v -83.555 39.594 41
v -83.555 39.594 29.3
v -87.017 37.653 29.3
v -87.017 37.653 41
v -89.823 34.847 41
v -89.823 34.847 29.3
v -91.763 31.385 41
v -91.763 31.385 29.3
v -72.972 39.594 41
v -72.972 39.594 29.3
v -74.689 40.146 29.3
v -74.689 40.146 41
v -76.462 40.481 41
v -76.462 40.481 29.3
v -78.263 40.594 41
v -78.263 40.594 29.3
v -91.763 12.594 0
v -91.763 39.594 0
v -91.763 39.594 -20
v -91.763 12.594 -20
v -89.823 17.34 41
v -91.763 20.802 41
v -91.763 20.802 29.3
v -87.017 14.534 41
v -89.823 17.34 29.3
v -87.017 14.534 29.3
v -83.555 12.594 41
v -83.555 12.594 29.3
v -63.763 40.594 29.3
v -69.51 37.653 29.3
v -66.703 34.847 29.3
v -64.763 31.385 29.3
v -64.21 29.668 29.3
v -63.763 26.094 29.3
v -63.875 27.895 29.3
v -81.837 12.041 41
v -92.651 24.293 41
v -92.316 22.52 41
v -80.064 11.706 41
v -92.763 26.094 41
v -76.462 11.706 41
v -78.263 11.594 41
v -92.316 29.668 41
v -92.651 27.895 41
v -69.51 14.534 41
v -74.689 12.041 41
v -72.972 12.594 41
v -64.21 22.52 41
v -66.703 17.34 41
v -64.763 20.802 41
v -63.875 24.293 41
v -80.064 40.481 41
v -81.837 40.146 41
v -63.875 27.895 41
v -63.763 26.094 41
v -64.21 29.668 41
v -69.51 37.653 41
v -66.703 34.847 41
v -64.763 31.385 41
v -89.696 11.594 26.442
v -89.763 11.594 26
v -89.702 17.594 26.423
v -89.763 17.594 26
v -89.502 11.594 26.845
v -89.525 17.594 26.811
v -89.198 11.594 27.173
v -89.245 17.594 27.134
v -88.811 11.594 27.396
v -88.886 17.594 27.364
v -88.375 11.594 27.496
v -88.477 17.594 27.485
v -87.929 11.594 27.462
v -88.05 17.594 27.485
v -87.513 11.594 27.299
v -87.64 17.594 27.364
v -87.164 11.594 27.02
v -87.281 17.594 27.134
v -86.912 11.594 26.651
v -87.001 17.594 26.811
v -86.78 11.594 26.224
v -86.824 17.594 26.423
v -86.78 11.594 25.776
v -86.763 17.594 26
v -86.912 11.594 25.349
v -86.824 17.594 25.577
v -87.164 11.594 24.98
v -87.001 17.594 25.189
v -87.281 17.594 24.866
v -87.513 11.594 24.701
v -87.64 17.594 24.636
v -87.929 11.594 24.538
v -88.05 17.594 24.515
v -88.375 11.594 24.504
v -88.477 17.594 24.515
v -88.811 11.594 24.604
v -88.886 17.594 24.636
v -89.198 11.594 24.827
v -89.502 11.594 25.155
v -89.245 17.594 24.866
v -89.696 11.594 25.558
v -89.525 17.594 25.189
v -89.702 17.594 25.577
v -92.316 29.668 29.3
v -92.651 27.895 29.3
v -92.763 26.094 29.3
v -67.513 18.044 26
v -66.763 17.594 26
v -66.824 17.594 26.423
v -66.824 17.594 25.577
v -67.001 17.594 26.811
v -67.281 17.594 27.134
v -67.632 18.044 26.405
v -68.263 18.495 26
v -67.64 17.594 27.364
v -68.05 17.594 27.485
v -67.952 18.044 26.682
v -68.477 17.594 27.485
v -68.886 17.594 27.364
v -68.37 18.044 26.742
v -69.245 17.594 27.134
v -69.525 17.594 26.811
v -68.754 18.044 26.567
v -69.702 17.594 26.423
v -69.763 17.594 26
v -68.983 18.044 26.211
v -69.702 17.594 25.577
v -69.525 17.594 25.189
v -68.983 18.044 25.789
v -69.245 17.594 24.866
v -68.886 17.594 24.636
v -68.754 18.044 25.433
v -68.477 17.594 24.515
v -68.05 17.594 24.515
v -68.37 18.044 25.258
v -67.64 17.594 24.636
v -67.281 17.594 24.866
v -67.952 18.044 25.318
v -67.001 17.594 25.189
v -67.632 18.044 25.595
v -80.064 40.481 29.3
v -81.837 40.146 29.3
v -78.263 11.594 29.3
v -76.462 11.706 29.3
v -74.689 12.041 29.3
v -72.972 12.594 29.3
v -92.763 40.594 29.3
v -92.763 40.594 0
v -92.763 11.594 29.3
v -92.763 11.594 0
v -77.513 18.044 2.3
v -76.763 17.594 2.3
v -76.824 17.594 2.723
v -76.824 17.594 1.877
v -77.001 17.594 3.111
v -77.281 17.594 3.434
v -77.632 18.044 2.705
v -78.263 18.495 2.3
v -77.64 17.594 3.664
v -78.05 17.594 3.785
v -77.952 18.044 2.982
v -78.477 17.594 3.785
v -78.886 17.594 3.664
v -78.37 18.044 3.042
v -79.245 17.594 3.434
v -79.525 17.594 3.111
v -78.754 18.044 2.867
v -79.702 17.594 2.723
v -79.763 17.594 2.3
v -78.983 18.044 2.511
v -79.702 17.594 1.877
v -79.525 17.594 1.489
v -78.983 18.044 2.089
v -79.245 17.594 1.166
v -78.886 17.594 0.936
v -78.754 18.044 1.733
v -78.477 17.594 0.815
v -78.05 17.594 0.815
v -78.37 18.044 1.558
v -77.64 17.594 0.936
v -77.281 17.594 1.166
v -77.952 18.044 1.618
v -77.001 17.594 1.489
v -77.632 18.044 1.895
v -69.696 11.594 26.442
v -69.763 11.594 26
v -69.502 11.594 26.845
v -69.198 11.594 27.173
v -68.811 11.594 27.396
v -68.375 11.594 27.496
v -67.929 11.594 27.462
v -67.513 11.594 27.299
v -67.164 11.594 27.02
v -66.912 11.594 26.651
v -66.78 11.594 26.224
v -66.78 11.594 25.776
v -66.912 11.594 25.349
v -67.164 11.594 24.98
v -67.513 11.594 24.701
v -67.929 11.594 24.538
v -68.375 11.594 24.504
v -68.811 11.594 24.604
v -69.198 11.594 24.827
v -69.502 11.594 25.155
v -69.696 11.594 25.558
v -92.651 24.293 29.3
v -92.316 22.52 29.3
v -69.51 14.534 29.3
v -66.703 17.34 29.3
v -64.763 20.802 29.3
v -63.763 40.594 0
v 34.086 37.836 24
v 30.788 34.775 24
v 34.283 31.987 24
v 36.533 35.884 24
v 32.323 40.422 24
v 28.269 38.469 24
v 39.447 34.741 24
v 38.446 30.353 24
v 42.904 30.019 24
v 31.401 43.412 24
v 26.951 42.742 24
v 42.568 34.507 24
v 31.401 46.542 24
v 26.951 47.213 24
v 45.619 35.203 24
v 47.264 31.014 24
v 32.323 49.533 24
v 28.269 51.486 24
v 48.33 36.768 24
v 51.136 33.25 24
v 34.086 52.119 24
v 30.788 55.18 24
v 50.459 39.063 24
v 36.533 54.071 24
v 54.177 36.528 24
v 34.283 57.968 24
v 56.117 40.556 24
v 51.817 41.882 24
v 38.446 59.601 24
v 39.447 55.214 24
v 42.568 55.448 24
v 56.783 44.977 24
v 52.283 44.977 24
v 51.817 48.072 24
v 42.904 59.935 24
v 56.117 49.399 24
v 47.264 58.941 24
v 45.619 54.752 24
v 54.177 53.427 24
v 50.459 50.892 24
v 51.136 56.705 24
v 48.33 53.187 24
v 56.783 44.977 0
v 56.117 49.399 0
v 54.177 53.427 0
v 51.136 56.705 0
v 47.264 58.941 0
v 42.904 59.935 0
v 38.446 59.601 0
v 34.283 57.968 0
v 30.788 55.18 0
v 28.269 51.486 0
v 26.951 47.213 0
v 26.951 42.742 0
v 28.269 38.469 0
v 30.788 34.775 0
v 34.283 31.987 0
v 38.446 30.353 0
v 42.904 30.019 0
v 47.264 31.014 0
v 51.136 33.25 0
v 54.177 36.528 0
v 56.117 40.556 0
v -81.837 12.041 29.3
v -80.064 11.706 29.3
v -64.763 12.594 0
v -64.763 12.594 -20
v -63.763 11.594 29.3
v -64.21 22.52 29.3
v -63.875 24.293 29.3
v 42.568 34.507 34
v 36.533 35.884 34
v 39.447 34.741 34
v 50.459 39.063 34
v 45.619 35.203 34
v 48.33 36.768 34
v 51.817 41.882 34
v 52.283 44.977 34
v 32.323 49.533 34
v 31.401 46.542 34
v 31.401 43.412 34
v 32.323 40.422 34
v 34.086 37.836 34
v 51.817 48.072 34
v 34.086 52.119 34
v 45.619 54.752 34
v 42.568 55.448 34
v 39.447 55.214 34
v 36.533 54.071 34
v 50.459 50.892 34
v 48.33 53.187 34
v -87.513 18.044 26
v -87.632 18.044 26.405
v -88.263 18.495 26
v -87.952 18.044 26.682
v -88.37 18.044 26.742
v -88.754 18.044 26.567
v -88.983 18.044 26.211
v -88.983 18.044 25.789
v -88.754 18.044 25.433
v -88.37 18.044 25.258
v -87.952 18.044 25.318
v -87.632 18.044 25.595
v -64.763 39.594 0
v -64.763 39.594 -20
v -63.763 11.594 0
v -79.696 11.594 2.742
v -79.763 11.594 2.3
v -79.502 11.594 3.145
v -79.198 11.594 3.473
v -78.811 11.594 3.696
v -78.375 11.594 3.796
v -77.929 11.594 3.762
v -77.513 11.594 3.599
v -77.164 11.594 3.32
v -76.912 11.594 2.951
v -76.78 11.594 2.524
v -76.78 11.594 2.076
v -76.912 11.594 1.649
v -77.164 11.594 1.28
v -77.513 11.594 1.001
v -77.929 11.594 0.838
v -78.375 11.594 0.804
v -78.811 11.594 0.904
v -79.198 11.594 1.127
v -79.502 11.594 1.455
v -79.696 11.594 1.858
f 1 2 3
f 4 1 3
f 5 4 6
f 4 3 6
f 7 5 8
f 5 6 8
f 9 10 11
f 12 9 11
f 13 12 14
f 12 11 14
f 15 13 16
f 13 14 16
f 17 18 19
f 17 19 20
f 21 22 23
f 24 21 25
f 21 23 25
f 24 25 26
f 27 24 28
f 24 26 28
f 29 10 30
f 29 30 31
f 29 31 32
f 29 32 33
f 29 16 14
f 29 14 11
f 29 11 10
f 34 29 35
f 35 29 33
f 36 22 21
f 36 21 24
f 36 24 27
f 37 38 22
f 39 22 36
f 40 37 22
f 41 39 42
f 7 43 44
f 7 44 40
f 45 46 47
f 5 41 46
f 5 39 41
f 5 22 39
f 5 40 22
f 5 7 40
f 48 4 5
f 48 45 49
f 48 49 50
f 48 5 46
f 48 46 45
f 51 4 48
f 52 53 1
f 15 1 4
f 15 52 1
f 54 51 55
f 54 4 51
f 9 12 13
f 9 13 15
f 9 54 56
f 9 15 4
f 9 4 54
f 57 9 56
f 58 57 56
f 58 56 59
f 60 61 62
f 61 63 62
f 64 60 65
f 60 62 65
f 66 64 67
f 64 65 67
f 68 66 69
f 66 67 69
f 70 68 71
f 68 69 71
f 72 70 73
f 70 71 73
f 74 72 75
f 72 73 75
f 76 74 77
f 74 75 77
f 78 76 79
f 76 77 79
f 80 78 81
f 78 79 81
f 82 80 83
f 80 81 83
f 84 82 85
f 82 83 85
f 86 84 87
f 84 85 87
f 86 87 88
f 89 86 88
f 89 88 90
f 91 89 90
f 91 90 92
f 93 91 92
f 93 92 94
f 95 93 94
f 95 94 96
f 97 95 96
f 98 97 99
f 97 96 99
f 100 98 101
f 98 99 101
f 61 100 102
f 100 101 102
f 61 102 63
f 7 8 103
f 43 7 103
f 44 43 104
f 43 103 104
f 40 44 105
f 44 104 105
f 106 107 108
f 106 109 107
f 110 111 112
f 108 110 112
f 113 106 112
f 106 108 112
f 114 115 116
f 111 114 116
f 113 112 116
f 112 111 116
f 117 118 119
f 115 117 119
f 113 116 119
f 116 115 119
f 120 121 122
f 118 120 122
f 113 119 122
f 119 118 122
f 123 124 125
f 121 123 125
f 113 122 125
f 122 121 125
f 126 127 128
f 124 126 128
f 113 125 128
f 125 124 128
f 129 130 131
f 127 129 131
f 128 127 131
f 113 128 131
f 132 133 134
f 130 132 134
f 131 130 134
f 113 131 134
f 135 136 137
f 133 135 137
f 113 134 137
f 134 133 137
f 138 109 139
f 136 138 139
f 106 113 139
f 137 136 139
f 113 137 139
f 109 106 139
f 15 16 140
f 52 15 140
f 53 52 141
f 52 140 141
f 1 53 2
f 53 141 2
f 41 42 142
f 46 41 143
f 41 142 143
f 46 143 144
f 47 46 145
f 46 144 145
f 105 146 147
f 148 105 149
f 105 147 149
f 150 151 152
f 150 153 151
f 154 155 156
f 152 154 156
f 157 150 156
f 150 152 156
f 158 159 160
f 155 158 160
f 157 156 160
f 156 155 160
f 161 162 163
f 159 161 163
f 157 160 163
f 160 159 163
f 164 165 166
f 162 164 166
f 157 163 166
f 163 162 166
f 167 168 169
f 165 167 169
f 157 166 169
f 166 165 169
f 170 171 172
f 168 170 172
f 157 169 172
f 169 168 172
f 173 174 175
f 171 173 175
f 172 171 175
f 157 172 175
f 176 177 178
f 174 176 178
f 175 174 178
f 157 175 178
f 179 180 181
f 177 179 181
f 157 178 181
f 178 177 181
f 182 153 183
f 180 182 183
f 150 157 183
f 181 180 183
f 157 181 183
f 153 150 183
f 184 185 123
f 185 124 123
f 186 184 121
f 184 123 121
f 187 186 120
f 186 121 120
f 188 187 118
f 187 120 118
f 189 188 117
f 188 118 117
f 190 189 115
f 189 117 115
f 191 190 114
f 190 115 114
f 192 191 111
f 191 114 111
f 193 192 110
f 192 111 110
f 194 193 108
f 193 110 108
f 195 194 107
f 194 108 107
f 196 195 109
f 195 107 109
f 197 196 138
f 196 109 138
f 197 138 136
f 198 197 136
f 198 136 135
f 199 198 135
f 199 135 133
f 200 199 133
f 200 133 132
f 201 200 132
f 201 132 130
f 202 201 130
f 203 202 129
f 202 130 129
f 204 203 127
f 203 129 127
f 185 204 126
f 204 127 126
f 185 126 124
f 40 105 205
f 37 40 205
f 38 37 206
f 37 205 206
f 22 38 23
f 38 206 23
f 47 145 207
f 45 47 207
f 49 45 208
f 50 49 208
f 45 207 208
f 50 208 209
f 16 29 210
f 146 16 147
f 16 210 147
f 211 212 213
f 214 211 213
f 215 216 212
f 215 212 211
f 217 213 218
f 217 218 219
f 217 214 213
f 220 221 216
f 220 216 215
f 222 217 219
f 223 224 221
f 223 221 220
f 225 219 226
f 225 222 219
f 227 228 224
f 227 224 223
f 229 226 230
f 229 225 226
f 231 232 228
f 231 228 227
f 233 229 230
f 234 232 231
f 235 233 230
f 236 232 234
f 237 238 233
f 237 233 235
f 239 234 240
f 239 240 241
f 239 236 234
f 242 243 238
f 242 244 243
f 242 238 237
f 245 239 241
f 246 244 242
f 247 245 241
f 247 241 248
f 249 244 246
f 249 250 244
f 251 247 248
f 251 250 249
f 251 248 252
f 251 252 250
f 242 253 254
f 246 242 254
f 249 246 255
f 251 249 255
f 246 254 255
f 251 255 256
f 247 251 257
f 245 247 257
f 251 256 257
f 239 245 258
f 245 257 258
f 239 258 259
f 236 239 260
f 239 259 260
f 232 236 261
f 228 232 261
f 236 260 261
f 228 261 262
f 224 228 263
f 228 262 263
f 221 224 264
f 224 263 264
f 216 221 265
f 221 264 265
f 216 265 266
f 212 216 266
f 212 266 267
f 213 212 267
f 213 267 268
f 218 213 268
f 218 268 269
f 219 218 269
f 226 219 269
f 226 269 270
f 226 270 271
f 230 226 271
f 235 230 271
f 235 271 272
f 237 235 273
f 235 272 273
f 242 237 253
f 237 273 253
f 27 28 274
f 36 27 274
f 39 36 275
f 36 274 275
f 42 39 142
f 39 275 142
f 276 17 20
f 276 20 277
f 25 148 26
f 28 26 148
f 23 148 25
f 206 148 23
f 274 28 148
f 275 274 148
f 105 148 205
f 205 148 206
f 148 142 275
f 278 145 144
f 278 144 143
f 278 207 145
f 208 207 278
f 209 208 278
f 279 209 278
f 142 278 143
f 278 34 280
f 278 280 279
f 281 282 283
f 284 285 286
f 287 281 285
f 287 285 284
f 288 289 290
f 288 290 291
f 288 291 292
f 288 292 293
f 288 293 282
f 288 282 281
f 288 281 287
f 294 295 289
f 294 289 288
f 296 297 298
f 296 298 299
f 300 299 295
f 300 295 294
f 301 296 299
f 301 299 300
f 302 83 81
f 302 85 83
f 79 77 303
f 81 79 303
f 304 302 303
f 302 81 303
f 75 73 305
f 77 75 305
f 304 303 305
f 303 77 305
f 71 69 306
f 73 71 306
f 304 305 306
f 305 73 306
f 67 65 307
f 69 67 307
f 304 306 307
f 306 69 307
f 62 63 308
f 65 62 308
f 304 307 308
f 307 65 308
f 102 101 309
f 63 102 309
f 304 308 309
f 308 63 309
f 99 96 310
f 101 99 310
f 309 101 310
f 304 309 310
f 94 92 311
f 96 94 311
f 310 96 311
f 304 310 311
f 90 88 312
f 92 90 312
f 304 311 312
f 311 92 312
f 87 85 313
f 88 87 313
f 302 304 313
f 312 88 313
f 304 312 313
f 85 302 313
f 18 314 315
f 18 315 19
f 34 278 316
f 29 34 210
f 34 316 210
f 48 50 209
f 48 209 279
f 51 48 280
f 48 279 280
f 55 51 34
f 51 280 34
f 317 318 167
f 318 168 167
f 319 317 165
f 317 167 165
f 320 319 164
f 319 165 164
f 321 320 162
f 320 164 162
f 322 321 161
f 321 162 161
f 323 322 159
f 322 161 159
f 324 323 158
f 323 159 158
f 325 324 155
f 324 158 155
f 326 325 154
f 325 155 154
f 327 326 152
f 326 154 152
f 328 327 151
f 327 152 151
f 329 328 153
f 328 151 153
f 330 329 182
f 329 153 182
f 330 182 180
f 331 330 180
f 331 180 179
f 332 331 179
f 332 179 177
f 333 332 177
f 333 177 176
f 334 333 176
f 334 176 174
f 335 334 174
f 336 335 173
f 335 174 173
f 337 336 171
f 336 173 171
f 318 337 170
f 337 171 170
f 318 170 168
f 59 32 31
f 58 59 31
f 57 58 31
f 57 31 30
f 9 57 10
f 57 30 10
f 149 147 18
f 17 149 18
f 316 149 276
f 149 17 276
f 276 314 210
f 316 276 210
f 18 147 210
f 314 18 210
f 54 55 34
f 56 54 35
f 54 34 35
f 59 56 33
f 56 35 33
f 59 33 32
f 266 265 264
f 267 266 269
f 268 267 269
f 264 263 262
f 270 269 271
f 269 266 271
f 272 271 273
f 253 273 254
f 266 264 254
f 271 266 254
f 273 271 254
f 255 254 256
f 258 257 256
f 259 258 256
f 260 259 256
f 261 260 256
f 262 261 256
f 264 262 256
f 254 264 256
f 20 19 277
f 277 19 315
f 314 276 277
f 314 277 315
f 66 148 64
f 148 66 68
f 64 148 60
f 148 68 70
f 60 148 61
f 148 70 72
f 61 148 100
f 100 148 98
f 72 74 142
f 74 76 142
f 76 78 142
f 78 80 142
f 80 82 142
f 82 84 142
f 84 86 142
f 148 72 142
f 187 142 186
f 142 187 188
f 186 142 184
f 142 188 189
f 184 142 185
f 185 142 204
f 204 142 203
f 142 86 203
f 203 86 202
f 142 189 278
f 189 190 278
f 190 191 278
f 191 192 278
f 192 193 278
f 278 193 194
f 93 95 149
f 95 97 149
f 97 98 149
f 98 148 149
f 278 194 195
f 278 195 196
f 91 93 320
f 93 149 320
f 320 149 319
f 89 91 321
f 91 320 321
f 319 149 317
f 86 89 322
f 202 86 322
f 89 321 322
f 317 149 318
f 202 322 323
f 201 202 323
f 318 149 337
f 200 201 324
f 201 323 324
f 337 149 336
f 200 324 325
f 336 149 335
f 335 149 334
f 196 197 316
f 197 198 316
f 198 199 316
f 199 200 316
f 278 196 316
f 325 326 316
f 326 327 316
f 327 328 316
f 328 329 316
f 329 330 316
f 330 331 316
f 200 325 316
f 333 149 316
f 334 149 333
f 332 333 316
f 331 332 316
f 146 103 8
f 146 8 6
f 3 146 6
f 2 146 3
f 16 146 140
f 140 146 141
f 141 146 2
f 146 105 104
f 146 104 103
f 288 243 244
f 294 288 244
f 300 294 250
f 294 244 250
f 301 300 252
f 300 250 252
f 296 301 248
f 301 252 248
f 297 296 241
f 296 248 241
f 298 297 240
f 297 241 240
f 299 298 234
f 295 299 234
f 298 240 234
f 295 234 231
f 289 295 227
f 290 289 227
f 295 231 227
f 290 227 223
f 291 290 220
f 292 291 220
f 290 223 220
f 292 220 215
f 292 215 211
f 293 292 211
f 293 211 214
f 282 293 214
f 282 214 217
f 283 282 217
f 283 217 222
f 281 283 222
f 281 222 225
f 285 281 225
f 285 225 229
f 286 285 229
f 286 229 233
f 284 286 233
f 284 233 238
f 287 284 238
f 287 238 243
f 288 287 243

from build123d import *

# Parameters (mm, degrees)
F1_DEPTH = 29.3
F2_DEPTH = 41
F0_R     = 15
F0_R_2   = 10.5
F3_DEPTH = 24
F4_DEPTH = 34
F5_DEPTH = 20
F7_D     = 3
F7_DEPTH = 6
F7_TIP   = 0.9012909285


with BuildPart() as f1:
    # F0 (on Top) → F1 (new body)
    with BuildSketch(Plane.XY):
        with BuildLine():
            Line((-63.763101964, 40.5936958569), (-78.263101964, 40.5936958569))
            ThreePointArc((-78.263101964, 40.5936958569), (-75.5705195605, 40.3415027057), (-72.9715993419, 39.5936958569))
            Line((-72.9715993419, 39.5936958569), (-64.763101964, 39.5936958569))
            Line((-64.763101964, 39.5936958569), (-64.763101964, 31.3851984791))
            ThreePointArc((-64.763101964, 31.3851984791), (-64.0152951153, 28.7862782605), (-63.763101964, 26.0936958569))
            Line((-63.763101964, 26.0936958569), (-63.763101964, 40.5936958569))
        make_face()
        with BuildLine():
            Line((-63.763101964, 11.5936958569), (-63.763101964, 26.0936958569))
            ThreePointArc((-63.763101964, 26.0936958569), (-64.0152951153, 23.4011134534), (-64.763101964, 20.8021932348))
            Line((-64.763101964, 20.8021932348), (-64.763101964, 12.5936958569))
            Line((-64.763101964, 12.5936958569), (-72.9715993419, 12.5936958569))
            ThreePointArc((-72.9715993419, 12.5936958569), (-75.5705195605, 11.8458890082), (-78.263101964, 11.5936958569))
            Line((-78.263101964, 11.5936958569), (-63.763101964, 11.5936958569))
        make_face()
        with BuildLine():
            ThreePointArc((-72.9715993419, 39.5936958569), (-75.5705195605, 40.3415027057), (-78.263101964, 40.5936958569))
            ThreePointArc((-78.263101964, 40.5936958569), (-80.9556843676, 40.3415027057), (-83.5546045862, 39.5936958569))
            Line((-83.5546045862, 39.5936958569), (-72.9715993419, 39.5936958569))
        make_face()
        with BuildLine():
            Line((-78.263101964, 40.5936958569), (-92.763101964, 40.5936958569))
            Line((-92.763101964, 40.5936958569), (-92.763101964, 26.0936958569))
            ThreePointArc((-92.763101964, 26.0936958569), (-92.5109088128, 28.7862782605), (-91.763101964, 31.3851984791))
            Line((-91.763101964, 31.3851984791), (-91.763101964, 39.5936958569))
            Line((-91.763101964, 39.5936958569), (-83.5546045862, 39.5936958569))
            ThreePointArc((-83.5546045862, 39.5936958569), (-80.9556843676, 40.3415027057), (-78.263101964, 40.5936958569))
        make_face()
        with BuildLine():
            ThreePointArc((-64.763101964, 31.3851984791), (-68.0100536368, 36.3467441841), (-72.9715993419, 39.5936958569))
            Line((-72.9715993419, 39.5936958569), (-83.5546045862, 39.5936958569))
            ThreePointArc((-83.5546045862, 39.5936958569), (-88.5161502912, 36.3467441841), (-91.763101964, 31.3851984791))
            Line((-91.763101964, 31.3851984791), (-91.763101964, 20.8021932348))
            ThreePointArc((-91.763101964, 20.8021932348), (-88.5161502912, 15.8406475297), (-83.5546045862, 12.5936958569))
            Line((-83.5546045862, 12.5936958569), (-72.9715993419, 12.5936958569))
            ThreePointArc((-72.9715993419, 12.5936958569), (-68.0100536368, 15.8406475297), (-64.763101964, 20.8021932348))
            Line((-64.763101964, 20.8021932348), (-64.763101964, 31.3851984791))
        make_face()
        with BuildLine():
            Line((-64.763101964, 39.5936958569), (-72.9715993419, 39.5936958569))
            ThreePointArc((-72.9715993419, 39.5936958569), (-68.0100536368, 36.3467441841), (-64.763101964, 31.3851984791))
            Line((-64.763101964, 31.3851984791), (-64.763101964, 39.5936958569))
        make_face()
        with BuildLine():
            ThreePointArc((-91.763101964, 31.3851984791), (-88.5161502912, 36.3467441841), (-83.5546045862, 39.5936958569))
            Line((-83.5546045862, 39.5936958569), (-91.763101964, 39.5936958569))
            Line((-91.763101964, 39.5936958569), (-91.763101964, 31.3851984791))
        make_face()
        with BuildLine():
            ThreePointArc((-83.5546045862, 12.5936958569), (-88.5161502912, 15.8406475297), (-91.763101964, 20.8021932348))
            Line((-91.763101964, 20.8021932348), (-91.763101964, 12.5936958569))
            Line((-91.763101964, 12.5936958569), (-83.5546045862, 12.5936958569))
        make_face()
        with BuildLine():
            Line((-64.763101964, 12.5936958569), (-64.763101964, 20.8021932348))
            ThreePointArc((-64.763101964, 20.8021932348), (-68.0100536368, 15.8406475297), (-72.9715993419, 12.5936958569))
            Line((-72.9715993419, 12.5936958569), (-64.763101964, 12.5936958569))
        make_face()
        with BuildLine():
            ThreePointArc((-83.5546045862, 12.5936958569), (-80.9556843676, 11.8458890082), (-78.263101964, 11.5936958569))
            ThreePointArc((-78.263101964, 11.5936958569), (-75.5705195605, 11.8458890082), (-72.9715993419, 12.5936958569))
            Line((-72.9715993419, 12.5936958569), (-83.5546045862, 12.5936958569))
        make_face()
        with BuildLine():
            ThreePointArc((-91.763101964, 20.8021932348), (-92.5109088128, 23.4011134534), (-92.763101964, 26.0936958569))
            Line((-92.763101964, 26.0936958569), (-92.763101964, 11.5936958569))
            Line((-92.763101964, 11.5936958569), (-78.263101964, 11.5936958569))
            ThreePointArc((-78.263101964, 11.5936958569), (-80.9556843676, 11.8458890082), (-83.5546045862, 12.5936958569))
            Line((-83.5546045862, 12.5936958569), (-91.763101964, 12.5936958569))
            Line((-91.763101964, 12.5936958569), (-91.763101964, 20.8021932348))
        make_face()
        with BuildLine():
            ThreePointArc((-64.763101964, 20.8021932348), (-64.0152951153, 23.4011134534), (-63.763101964, 26.0936958569))
            ThreePointArc((-63.763101964, 26.0936958569), (-64.0152951153, 28.7862782605), (-64.763101964, 31.3851984791))
            Line((-64.763101964, 31.3851984791), (-64.763101964, 20.8021932348))
        make_face()
        with BuildLine():
            ThreePointArc((-91.763101964, 31.3851984791), (-92.5109088128, 28.7862782605), (-92.763101964, 26.0936958569))
            ThreePointArc((-92.763101964, 26.0936958569), (-92.5109088128, 23.4011134534), (-91.763101964, 20.8021932348))
            Line((-91.763101964, 20.8021932348), (-91.763101964, 31.3851984791))
        make_face()
    extrude(amount=F1_DEPTH)

    # F0 (on Top) → F2 (join)
    with BuildSketch(Plane.XY):
        with BuildLine():
            ThreePointArc((-72.9715993419, 39.5936958569), (-75.5705195605, 40.3415027057), (-78.263101964, 40.5936958569))
            ThreePointArc((-78.263101964, 40.5936958569), (-80.9556843676, 40.3415027057), (-83.5546045862, 39.5936958569))
            Line((-83.5546045862, 39.5936958569), (-72.9715993419, 39.5936958569))
        make_face()
        with BuildLine():
            ThreePointArc((-64.763101964, 31.3851984791), (-68.0100536368, 36.3467441841), (-72.9715993419, 39.5936958569))
            Line((-72.9715993419, 39.5936958569), (-83.5546045862, 39.5936958569))
            ThreePointArc((-83.5546045862, 39.5936958569), (-88.5161502912, 36.3467441841), (-91.763101964, 31.3851984791))
            Line((-91.763101964, 31.3851984791), (-91.763101964, 20.8021932348))
            ThreePointArc((-91.763101964, 20.8021932348), (-88.5161502912, 15.8406475297), (-83.5546045862, 12.5936958569))
            Line((-83.5546045862, 12.5936958569), (-72.9715993419, 12.5936958569))
            ThreePointArc((-72.9715993419, 12.5936958569), (-68.0100536368, 15.8406475297), (-64.763101964, 20.8021932348))
            Line((-64.763101964, 20.8021932348), (-64.763101964, 31.3851984791))
        make_face()
        with BuildLine():
            ThreePointArc((-91.763101964, 31.3851984791), (-92.5109088128, 28.7862782605), (-92.763101964, 26.0936958569))
            ThreePointArc((-92.763101964, 26.0936958569), (-92.5109088128, 23.4011134534), (-91.763101964, 20.8021932348))
            Line((-91.763101964, 20.8021932348), (-91.763101964, 31.3851984791))
        make_face()
        with BuildLine():
            ThreePointArc((-83.5546045862, 12.5936958569), (-80.9556843676, 11.8458890082), (-78.263101964, 11.5936958569))
            ThreePointArc((-78.263101964, 11.5936958569), (-75.5705195605, 11.8458890082), (-72.9715993419, 12.5936958569))
            Line((-72.9715993419, 12.5936958569), (-83.5546045862, 12.5936958569))
        make_face()
        with BuildLine():
            ThreePointArc((-64.763101964, 20.8021932348), (-64.0152951153, 23.4011134534), (-63.763101964, 26.0936958569))
            ThreePointArc((-63.763101964, 26.0936958569), (-64.0152951153, 28.7862782605), (-64.763101964, 31.3851984791))
            Line((-64.763101964, 31.3851984791), (-64.763101964, 20.8021932348))
        make_face()
    extrude(amount=F2_DEPTH)

    # F0 (on Top) → F5 (join)
    with BuildSketch(Plane.XY):
        with BuildLine():
            ThreePointArc((-64.763101964, 31.3851984791), (-68.0100536368, 36.3467441841), (-72.9715993419, 39.5936958569))
            Line((-72.9715993419, 39.5936958569), (-83.5546045862, 39.5936958569))
            ThreePointArc((-83.5546045862, 39.5936958569), (-88.5161502912, 36.3467441841), (-91.763101964, 31.3851984791))
            Line((-91.763101964, 31.3851984791), (-91.763101964, 20.8021932348))
            ThreePointArc((-91.763101964, 20.8021932348), (-88.5161502912, 15.8406475297), (-83.5546045862, 12.5936958569))
            Line((-83.5546045862, 12.5936958569), (-72.9715993419, 12.5936958569))
            ThreePointArc((-72.9715993419, 12.5936958569), (-68.0100536368, 15.8406475297), (-64.763101964, 20.8021932348))
            Line((-64.763101964, 20.8021932348), (-64.763101964, 31.3851984791))
        make_face()
        with BuildLine():
            Line((-64.763101964, 39.5936958569), (-72.9715993419, 39.5936958569))
            ThreePointArc((-72.9715993419, 39.5936958569), (-68.0100536368, 36.3467441841), (-64.763101964, 31.3851984791))
            Line((-64.763101964, 31.3851984791), (-64.763101964, 39.5936958569))
        make_face()
        with BuildLine():
            ThreePointArc((-91.763101964, 31.3851984791), (-88.5161502912, 36.3467441841), (-83.5546045862, 39.5936958569))
            Line((-83.5546045862, 39.5936958569), (-91.763101964, 39.5936958569))
            Line((-91.763101964, 39.5936958569), (-91.763101964, 31.3851984791))
        make_face()
        with BuildLine():
            ThreePointArc((-83.5546045862, 12.5936958569), (-88.5161502912, 15.8406475297), (-91.763101964, 20.8021932348))
            Line((-91.763101964, 20.8021932348), (-91.763101964, 12.5936958569))
            Line((-91.763101964, 12.5936958569), (-83.5546045862, 12.5936958569))
        make_face()
        with BuildLine():
            Line((-64.763101964, 12.5936958569), (-64.763101964, 20.8021932348))
            ThreePointArc((-64.763101964, 20.8021932348), (-68.0100536368, 15.8406475297), (-72.9715993419, 12.5936958569))
            Line((-72.9715993419, 12.5936958569), (-64.763101964, 12.5936958569))
        make_face()
    extrude(amount=-F5_DEPTH)

    # F7
    with Locations(Plane.XZ.offset(-11.5936958569)):
        with Locations((-68.263101964, 26), (-78.263101964, 2.3), (-88.263101964, 26)):
            Hole(F7_D / 2, depth=F7_DEPTH)
            with Locations((0, 0, -(F7_DEPTH + F7_TIP / 2))):  # 118° drill point
                Cone(0, F7_D / 2, F7_TIP, mode=Mode.SUBTRACT)


with BuildPart() as f3:
    # F0 (on Top) → F3 (new body)
    with BuildSketch(Plane.XY):
        with Locations((41.7834050647, 44.9774078268)):
            Circle(F0_R)
        with Locations((41.7834050647, 44.9774078268)):
            Circle(F0_R_2, mode=Mode.SUBTRACT)
        with Locations((41.7834050647, 44.9774078268)):
            Circle(F0_R_2)
    extrude(amount=F3_DEPTH)

    # F0 (on Top) → F4 (join)
    with BuildSketch(Plane.XY):
        with Locations((41.7834050647, 44.9774078268)):
            Circle(F0_R_2)
    extrude(amount=F4_DEPTH)


solid = Compound([f1.part, f3.part])
